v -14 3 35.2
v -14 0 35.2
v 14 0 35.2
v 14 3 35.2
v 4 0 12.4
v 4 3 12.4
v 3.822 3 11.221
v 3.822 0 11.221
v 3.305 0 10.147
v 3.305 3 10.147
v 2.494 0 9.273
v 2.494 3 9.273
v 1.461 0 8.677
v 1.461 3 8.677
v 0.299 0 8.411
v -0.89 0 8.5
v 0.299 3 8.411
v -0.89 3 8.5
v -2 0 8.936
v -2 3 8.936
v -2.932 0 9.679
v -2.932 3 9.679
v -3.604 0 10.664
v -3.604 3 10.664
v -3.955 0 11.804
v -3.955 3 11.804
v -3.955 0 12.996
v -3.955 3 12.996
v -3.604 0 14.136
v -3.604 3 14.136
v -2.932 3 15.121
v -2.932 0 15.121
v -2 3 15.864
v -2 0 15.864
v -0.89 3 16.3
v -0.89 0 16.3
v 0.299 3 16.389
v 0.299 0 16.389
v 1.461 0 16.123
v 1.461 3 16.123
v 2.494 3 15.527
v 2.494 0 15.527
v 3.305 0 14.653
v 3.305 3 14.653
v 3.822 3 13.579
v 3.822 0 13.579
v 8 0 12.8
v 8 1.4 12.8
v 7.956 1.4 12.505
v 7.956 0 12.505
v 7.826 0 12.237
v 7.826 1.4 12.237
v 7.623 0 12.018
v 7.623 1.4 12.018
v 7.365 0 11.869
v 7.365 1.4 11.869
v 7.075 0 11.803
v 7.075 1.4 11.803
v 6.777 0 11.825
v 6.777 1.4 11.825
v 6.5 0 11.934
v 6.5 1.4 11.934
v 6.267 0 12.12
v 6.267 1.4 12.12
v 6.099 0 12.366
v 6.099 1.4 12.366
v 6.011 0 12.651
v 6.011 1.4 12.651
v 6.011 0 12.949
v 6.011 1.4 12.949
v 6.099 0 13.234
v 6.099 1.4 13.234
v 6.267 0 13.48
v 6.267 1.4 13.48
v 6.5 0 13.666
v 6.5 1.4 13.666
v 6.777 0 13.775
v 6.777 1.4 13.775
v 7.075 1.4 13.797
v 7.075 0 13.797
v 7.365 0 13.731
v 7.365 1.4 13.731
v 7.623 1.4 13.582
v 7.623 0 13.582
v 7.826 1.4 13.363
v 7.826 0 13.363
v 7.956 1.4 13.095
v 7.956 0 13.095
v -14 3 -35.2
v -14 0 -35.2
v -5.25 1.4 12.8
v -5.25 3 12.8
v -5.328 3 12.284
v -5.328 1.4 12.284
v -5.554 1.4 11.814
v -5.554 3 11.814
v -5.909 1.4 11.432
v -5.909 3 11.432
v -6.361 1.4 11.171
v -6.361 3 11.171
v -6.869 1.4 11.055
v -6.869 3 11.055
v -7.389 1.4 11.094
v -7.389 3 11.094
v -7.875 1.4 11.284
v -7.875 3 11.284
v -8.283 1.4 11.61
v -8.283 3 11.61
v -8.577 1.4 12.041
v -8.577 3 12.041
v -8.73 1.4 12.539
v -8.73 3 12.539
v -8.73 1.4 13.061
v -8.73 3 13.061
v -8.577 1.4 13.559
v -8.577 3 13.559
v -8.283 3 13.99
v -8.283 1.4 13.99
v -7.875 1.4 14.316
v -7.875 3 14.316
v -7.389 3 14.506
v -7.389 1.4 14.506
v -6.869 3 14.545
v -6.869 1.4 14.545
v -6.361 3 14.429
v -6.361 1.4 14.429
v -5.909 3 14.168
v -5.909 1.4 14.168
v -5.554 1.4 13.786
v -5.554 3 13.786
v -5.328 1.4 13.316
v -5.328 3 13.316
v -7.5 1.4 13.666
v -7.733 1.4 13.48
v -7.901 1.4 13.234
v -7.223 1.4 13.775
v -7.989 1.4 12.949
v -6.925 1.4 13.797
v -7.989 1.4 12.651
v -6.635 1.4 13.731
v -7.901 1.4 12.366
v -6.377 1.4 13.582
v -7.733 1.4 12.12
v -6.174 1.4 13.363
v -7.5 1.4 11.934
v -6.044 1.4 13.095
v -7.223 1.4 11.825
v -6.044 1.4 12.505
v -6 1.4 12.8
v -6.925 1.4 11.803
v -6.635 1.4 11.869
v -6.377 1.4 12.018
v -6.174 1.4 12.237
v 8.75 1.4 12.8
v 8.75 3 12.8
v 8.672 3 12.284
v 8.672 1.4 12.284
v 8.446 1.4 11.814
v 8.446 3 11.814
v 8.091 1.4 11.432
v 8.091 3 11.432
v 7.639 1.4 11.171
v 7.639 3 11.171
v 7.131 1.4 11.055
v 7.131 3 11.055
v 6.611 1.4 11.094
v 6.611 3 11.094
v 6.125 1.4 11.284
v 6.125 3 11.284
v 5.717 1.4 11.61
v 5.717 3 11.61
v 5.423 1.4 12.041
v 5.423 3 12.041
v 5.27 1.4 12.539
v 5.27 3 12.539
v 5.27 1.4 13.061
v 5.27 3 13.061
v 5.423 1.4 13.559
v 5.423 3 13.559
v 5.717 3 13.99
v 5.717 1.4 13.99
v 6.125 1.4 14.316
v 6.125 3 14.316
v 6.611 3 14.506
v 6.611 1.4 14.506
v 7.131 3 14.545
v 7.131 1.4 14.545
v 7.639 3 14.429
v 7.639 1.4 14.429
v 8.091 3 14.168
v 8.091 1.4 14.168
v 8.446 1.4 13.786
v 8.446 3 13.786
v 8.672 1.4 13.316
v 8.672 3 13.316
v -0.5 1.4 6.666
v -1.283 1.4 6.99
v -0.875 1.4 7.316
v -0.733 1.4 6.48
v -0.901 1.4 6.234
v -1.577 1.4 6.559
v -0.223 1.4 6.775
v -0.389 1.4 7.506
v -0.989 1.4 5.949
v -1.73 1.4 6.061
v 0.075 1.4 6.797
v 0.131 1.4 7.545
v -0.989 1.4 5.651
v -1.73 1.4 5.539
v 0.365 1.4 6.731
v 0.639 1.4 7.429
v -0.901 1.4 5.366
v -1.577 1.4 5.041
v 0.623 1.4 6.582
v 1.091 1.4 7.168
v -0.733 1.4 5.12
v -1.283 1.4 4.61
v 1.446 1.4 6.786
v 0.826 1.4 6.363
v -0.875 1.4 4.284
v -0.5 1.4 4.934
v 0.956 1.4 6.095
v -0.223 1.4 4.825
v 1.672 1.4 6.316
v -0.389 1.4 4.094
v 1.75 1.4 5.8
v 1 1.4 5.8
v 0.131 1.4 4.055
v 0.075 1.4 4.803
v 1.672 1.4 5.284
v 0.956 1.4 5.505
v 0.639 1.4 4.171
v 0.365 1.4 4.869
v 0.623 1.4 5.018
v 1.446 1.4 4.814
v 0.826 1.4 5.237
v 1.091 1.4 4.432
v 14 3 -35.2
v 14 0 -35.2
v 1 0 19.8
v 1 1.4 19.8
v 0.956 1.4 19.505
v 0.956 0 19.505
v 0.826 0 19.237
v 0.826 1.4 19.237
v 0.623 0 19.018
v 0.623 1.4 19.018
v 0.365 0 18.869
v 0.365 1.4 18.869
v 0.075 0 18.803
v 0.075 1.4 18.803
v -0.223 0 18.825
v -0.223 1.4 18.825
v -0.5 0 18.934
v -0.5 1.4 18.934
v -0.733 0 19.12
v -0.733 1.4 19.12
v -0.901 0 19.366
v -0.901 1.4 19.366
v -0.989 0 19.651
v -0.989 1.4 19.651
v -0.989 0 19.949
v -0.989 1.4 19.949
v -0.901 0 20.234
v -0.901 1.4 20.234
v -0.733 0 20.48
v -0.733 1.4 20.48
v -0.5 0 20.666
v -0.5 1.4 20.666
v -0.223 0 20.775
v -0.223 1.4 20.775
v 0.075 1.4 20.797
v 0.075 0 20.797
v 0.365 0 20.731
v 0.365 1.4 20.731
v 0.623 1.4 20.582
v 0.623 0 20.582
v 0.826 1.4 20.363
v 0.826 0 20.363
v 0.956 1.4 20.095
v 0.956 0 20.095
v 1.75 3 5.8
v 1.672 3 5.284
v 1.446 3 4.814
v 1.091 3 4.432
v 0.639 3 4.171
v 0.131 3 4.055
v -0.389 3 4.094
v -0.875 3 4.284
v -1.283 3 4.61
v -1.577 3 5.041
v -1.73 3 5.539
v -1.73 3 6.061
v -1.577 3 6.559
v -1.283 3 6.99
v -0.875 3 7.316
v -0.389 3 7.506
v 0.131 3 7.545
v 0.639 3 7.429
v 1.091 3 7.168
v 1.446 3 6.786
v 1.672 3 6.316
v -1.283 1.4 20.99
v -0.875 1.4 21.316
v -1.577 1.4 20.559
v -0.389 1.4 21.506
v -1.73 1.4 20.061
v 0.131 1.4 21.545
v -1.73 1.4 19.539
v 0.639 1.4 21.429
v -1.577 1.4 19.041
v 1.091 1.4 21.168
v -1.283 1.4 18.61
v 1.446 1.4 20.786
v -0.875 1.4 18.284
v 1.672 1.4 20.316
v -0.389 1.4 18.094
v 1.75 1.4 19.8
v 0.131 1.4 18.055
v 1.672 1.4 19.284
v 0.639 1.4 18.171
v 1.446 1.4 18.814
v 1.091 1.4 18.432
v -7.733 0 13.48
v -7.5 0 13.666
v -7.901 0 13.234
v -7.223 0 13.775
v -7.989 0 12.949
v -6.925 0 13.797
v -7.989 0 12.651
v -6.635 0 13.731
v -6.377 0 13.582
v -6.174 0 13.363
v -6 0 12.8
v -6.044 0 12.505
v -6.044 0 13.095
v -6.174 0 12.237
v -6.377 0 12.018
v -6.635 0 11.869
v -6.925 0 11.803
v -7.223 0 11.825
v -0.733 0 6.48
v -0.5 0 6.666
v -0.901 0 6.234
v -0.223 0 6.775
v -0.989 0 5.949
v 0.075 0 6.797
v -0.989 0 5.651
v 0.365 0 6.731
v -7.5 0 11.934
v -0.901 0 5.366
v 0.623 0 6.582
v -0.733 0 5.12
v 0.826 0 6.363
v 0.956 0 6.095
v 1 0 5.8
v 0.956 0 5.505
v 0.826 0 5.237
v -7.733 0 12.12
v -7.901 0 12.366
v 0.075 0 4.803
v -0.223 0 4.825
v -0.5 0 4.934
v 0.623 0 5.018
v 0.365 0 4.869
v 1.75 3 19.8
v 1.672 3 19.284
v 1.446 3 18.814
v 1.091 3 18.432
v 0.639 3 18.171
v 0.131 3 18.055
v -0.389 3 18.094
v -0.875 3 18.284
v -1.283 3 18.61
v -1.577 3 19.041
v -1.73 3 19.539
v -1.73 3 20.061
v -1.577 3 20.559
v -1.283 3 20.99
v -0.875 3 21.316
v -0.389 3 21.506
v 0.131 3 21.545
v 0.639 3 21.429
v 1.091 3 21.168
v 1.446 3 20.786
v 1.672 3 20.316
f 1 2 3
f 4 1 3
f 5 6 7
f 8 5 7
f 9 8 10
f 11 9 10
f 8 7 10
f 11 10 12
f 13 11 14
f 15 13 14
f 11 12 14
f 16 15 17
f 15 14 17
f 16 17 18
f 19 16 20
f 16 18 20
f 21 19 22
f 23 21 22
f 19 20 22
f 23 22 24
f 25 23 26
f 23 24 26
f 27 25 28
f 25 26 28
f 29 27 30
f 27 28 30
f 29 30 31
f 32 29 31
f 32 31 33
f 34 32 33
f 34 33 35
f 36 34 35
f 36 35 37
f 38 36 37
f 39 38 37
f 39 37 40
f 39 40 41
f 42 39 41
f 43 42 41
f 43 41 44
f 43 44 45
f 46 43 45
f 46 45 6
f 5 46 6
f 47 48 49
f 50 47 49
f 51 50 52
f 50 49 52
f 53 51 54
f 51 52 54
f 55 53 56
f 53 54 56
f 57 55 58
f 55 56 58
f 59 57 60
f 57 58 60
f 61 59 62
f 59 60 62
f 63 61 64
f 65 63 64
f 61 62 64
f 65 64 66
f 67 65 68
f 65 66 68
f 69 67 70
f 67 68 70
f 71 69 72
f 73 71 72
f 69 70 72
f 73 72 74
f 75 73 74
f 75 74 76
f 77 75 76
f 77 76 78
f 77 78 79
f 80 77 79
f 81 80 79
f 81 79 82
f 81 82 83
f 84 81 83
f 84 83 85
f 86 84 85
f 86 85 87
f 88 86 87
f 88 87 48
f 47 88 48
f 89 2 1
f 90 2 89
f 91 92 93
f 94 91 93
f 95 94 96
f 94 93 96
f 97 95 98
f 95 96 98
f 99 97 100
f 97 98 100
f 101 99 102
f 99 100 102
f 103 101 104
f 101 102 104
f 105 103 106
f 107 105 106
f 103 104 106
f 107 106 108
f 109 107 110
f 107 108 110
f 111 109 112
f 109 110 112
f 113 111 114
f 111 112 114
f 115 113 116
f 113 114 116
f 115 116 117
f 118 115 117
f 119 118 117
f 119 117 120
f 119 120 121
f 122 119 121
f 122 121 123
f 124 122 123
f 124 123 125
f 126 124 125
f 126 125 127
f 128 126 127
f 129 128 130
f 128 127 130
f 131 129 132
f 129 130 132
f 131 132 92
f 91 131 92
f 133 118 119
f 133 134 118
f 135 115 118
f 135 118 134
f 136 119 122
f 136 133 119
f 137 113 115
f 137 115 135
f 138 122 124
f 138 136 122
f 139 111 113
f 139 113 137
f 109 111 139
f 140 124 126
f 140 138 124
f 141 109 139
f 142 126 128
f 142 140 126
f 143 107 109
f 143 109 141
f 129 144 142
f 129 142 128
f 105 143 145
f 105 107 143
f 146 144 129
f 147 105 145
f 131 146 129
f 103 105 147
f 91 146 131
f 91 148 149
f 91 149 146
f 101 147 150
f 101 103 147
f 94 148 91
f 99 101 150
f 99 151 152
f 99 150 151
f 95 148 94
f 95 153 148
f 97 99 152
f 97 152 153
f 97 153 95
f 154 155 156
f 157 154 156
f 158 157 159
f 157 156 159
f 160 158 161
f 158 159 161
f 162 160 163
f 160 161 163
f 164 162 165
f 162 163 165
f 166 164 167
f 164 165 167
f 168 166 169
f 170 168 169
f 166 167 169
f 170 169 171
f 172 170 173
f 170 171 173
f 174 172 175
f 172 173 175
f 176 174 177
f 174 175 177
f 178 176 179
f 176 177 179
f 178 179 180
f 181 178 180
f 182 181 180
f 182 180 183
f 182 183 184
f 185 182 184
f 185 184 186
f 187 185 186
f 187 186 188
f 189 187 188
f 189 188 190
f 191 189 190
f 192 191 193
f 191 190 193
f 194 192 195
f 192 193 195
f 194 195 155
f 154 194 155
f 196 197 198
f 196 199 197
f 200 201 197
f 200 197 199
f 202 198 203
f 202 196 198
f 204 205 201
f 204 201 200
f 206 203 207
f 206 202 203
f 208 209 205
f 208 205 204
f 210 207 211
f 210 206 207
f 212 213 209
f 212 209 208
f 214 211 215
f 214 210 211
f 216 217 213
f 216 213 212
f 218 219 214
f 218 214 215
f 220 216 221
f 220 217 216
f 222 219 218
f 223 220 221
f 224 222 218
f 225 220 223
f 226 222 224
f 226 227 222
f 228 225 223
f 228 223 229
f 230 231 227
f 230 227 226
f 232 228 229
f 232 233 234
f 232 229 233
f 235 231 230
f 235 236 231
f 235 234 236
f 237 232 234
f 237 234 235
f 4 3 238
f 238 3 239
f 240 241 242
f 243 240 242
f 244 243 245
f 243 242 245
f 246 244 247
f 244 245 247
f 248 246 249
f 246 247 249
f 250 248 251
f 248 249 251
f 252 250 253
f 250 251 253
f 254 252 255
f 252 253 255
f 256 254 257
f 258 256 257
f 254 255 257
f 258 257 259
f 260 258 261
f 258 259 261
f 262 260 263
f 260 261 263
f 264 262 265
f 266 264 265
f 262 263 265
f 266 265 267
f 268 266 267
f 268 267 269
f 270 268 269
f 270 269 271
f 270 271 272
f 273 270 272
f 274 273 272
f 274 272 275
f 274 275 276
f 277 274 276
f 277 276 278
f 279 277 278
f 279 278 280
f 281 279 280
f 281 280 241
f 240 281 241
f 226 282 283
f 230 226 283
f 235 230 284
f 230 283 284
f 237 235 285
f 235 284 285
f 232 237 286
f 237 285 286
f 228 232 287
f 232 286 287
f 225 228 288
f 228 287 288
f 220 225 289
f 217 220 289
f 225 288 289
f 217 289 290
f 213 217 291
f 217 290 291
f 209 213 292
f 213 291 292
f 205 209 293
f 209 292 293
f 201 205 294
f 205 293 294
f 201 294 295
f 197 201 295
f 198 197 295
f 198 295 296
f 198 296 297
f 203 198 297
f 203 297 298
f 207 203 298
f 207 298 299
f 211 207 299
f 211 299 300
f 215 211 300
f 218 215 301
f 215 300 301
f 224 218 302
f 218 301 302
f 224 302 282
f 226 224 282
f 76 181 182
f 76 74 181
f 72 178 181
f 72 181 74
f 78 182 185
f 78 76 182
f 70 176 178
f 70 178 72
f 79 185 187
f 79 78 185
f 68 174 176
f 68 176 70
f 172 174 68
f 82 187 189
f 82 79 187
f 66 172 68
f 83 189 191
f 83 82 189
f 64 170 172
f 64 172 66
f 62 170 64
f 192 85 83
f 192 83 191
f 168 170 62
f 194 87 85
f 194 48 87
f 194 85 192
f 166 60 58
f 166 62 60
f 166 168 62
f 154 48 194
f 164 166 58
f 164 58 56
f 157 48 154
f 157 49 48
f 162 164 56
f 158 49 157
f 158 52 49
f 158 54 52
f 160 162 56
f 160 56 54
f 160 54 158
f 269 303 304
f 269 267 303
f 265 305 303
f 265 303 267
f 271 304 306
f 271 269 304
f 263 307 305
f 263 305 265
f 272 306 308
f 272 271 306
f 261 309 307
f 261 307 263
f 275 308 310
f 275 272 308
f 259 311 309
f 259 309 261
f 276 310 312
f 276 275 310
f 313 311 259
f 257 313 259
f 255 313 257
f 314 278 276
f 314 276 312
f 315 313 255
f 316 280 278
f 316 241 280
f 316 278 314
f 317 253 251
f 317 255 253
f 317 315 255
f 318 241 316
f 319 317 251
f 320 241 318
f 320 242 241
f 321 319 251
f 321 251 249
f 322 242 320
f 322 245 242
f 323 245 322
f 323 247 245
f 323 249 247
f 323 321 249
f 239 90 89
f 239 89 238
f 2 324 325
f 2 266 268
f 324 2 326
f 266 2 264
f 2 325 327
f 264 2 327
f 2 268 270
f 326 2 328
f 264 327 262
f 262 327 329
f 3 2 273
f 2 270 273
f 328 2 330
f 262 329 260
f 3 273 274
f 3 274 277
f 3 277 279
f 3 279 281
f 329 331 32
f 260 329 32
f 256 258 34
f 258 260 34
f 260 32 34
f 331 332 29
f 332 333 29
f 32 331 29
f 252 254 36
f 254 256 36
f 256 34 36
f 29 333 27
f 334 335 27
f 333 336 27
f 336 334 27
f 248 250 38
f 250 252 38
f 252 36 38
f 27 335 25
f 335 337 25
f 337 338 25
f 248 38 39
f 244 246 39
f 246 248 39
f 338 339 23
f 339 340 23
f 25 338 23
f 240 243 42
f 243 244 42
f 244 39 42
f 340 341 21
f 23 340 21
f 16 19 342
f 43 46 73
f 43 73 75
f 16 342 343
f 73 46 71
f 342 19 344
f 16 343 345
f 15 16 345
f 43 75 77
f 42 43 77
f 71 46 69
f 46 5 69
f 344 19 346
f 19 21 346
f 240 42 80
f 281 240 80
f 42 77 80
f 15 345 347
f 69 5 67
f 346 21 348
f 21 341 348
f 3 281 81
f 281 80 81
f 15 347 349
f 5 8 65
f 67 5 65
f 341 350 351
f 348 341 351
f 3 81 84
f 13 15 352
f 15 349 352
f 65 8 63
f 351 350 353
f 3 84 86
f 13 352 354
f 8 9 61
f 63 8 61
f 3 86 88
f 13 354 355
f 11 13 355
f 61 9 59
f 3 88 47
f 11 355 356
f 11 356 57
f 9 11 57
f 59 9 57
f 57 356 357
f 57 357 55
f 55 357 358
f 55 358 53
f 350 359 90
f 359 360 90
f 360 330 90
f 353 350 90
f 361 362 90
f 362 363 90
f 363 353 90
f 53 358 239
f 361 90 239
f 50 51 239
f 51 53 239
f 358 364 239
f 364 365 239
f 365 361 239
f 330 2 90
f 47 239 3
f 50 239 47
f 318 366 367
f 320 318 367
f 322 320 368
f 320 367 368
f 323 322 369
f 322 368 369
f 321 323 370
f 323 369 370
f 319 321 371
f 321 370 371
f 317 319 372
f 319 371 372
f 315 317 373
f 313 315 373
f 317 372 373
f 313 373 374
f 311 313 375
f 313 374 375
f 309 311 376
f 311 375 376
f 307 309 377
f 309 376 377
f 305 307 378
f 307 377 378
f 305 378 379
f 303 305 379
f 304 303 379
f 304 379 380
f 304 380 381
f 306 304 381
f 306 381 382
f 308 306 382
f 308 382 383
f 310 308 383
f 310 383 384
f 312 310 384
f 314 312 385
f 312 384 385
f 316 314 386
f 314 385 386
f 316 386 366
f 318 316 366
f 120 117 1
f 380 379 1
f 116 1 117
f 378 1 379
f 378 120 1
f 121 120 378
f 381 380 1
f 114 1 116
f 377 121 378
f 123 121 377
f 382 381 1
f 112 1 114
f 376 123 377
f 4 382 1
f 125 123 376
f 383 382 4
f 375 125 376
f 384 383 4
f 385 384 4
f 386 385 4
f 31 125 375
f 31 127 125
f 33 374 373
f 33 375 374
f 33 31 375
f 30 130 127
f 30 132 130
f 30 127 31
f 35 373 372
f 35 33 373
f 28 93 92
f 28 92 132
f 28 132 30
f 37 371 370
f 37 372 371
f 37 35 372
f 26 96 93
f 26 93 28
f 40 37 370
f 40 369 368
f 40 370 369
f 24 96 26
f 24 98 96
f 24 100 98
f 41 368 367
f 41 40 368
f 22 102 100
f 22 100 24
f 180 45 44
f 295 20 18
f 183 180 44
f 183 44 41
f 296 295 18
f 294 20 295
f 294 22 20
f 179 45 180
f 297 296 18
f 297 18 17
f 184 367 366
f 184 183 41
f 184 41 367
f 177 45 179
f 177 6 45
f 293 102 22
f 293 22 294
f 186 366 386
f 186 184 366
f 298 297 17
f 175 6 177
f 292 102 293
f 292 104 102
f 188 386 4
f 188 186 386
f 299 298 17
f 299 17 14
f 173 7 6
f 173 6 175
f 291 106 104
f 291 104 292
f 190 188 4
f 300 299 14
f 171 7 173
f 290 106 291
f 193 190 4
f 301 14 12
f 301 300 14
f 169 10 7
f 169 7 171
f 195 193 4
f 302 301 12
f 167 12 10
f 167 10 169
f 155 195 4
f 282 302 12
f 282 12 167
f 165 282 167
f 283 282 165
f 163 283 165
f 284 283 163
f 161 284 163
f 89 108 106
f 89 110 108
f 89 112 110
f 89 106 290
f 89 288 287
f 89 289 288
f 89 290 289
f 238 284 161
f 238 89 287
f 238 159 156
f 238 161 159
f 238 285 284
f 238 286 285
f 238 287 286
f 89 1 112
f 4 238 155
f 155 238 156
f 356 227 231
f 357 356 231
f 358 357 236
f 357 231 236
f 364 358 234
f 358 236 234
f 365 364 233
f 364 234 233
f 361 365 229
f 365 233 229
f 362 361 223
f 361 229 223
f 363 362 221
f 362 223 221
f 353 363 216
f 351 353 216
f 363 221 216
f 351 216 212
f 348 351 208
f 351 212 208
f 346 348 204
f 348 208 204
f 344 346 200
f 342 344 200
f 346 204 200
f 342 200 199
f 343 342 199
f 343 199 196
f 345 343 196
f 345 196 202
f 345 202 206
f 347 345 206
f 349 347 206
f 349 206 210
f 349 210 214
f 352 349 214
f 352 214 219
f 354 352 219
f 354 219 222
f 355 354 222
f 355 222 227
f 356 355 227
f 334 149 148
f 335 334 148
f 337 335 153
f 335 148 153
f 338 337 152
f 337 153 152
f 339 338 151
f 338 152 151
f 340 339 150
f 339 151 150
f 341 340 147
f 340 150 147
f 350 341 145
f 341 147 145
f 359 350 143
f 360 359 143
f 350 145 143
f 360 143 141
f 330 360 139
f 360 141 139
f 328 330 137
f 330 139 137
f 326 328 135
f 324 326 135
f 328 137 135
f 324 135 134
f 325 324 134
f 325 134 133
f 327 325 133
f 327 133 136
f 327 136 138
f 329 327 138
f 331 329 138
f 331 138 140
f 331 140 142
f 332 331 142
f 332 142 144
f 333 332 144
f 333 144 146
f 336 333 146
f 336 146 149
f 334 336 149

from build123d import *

# Parameters (mm, degrees)
SKETCH1_W           = 28
SKETCH1_H           = 70.4
BOSS_EXTRUDE1_DEPTH = 3
SKETCH4_R           = 1
CUT_EXTRUDE2_DEPTH  = 10
SKETCH5_R           = 4
CUT_EXTRUDE3_DEPTH  = 10
SKETCH10_R          = 1.75
CUT_EXTRUDE9_DEPTH  = 1.6


with BuildPart() as part:
    # Sketch1 → Boss-Extrude1 (new body)
    with BuildSketch(Plane(origin=(0, 0, 0), x_dir=(1, 0, 0), z_dir=(0, 1, 0))):
        Rectangle(SKETCH1_W, SKETCH1_H)
    extrude(amount=BOSS_EXTRUDE1_DEPTH)

    # Sketch4 → Cut-Extrude2 (cut)
    with BuildSketch(Plane(origin=(0, 3, 0), x_dir=(1, 0, 0), z_dir=(0, 1, 0))):
        with Locations((7, -12.8)):
            Circle(SKETCH4_R)
        with Locations((0, -19.8)):
            Circle(SKETCH4_R)
        with Locations((-7, -12.8)):
            Circle(SKETCH4_R)
        with Locations((0, -5.8)):
            Circle(SKETCH4_R)
    extrude(amount=-CUT_EXTRUDE2_DEPTH, mode=Mode.SUBTRACT)

    # Sketch5 → Cut-Extrude3 (cut)
    with BuildSketch(Plane(origin=(0, 3, 0), x_dir=(1, 0, 0), z_dir=(0, 1, 0))):
        with Locations((0, -12.4)):
            Circle(SKETCH5_R)
    extrude(amount=-CUT_EXTRUDE3_DEPTH, mode=Mode.SUBTRACT)

    # Sketch10 → Cut-Extrude9 (cut)
    with BuildSketch(Plane(origin=(0, 3, 0), x_dir=(1, 0, 0), z_dir=(0, 1, 0))):
        with Locations((0, -19.8)):
            Circle(SKETCH10_R)
        with Locations((-7, -12.8)):
            Circle(SKETCH10_R)
        with Locations((0, -5.8)):
            Circle(SKETCH10_R)
        with Locations((7, -12.8)):
            Circle(SKETCH10_R)
    extrude(amount=-CUT_EXTRUDE9_DEPTH, mode=Mode.SUBTRACT)


solid = part.part
